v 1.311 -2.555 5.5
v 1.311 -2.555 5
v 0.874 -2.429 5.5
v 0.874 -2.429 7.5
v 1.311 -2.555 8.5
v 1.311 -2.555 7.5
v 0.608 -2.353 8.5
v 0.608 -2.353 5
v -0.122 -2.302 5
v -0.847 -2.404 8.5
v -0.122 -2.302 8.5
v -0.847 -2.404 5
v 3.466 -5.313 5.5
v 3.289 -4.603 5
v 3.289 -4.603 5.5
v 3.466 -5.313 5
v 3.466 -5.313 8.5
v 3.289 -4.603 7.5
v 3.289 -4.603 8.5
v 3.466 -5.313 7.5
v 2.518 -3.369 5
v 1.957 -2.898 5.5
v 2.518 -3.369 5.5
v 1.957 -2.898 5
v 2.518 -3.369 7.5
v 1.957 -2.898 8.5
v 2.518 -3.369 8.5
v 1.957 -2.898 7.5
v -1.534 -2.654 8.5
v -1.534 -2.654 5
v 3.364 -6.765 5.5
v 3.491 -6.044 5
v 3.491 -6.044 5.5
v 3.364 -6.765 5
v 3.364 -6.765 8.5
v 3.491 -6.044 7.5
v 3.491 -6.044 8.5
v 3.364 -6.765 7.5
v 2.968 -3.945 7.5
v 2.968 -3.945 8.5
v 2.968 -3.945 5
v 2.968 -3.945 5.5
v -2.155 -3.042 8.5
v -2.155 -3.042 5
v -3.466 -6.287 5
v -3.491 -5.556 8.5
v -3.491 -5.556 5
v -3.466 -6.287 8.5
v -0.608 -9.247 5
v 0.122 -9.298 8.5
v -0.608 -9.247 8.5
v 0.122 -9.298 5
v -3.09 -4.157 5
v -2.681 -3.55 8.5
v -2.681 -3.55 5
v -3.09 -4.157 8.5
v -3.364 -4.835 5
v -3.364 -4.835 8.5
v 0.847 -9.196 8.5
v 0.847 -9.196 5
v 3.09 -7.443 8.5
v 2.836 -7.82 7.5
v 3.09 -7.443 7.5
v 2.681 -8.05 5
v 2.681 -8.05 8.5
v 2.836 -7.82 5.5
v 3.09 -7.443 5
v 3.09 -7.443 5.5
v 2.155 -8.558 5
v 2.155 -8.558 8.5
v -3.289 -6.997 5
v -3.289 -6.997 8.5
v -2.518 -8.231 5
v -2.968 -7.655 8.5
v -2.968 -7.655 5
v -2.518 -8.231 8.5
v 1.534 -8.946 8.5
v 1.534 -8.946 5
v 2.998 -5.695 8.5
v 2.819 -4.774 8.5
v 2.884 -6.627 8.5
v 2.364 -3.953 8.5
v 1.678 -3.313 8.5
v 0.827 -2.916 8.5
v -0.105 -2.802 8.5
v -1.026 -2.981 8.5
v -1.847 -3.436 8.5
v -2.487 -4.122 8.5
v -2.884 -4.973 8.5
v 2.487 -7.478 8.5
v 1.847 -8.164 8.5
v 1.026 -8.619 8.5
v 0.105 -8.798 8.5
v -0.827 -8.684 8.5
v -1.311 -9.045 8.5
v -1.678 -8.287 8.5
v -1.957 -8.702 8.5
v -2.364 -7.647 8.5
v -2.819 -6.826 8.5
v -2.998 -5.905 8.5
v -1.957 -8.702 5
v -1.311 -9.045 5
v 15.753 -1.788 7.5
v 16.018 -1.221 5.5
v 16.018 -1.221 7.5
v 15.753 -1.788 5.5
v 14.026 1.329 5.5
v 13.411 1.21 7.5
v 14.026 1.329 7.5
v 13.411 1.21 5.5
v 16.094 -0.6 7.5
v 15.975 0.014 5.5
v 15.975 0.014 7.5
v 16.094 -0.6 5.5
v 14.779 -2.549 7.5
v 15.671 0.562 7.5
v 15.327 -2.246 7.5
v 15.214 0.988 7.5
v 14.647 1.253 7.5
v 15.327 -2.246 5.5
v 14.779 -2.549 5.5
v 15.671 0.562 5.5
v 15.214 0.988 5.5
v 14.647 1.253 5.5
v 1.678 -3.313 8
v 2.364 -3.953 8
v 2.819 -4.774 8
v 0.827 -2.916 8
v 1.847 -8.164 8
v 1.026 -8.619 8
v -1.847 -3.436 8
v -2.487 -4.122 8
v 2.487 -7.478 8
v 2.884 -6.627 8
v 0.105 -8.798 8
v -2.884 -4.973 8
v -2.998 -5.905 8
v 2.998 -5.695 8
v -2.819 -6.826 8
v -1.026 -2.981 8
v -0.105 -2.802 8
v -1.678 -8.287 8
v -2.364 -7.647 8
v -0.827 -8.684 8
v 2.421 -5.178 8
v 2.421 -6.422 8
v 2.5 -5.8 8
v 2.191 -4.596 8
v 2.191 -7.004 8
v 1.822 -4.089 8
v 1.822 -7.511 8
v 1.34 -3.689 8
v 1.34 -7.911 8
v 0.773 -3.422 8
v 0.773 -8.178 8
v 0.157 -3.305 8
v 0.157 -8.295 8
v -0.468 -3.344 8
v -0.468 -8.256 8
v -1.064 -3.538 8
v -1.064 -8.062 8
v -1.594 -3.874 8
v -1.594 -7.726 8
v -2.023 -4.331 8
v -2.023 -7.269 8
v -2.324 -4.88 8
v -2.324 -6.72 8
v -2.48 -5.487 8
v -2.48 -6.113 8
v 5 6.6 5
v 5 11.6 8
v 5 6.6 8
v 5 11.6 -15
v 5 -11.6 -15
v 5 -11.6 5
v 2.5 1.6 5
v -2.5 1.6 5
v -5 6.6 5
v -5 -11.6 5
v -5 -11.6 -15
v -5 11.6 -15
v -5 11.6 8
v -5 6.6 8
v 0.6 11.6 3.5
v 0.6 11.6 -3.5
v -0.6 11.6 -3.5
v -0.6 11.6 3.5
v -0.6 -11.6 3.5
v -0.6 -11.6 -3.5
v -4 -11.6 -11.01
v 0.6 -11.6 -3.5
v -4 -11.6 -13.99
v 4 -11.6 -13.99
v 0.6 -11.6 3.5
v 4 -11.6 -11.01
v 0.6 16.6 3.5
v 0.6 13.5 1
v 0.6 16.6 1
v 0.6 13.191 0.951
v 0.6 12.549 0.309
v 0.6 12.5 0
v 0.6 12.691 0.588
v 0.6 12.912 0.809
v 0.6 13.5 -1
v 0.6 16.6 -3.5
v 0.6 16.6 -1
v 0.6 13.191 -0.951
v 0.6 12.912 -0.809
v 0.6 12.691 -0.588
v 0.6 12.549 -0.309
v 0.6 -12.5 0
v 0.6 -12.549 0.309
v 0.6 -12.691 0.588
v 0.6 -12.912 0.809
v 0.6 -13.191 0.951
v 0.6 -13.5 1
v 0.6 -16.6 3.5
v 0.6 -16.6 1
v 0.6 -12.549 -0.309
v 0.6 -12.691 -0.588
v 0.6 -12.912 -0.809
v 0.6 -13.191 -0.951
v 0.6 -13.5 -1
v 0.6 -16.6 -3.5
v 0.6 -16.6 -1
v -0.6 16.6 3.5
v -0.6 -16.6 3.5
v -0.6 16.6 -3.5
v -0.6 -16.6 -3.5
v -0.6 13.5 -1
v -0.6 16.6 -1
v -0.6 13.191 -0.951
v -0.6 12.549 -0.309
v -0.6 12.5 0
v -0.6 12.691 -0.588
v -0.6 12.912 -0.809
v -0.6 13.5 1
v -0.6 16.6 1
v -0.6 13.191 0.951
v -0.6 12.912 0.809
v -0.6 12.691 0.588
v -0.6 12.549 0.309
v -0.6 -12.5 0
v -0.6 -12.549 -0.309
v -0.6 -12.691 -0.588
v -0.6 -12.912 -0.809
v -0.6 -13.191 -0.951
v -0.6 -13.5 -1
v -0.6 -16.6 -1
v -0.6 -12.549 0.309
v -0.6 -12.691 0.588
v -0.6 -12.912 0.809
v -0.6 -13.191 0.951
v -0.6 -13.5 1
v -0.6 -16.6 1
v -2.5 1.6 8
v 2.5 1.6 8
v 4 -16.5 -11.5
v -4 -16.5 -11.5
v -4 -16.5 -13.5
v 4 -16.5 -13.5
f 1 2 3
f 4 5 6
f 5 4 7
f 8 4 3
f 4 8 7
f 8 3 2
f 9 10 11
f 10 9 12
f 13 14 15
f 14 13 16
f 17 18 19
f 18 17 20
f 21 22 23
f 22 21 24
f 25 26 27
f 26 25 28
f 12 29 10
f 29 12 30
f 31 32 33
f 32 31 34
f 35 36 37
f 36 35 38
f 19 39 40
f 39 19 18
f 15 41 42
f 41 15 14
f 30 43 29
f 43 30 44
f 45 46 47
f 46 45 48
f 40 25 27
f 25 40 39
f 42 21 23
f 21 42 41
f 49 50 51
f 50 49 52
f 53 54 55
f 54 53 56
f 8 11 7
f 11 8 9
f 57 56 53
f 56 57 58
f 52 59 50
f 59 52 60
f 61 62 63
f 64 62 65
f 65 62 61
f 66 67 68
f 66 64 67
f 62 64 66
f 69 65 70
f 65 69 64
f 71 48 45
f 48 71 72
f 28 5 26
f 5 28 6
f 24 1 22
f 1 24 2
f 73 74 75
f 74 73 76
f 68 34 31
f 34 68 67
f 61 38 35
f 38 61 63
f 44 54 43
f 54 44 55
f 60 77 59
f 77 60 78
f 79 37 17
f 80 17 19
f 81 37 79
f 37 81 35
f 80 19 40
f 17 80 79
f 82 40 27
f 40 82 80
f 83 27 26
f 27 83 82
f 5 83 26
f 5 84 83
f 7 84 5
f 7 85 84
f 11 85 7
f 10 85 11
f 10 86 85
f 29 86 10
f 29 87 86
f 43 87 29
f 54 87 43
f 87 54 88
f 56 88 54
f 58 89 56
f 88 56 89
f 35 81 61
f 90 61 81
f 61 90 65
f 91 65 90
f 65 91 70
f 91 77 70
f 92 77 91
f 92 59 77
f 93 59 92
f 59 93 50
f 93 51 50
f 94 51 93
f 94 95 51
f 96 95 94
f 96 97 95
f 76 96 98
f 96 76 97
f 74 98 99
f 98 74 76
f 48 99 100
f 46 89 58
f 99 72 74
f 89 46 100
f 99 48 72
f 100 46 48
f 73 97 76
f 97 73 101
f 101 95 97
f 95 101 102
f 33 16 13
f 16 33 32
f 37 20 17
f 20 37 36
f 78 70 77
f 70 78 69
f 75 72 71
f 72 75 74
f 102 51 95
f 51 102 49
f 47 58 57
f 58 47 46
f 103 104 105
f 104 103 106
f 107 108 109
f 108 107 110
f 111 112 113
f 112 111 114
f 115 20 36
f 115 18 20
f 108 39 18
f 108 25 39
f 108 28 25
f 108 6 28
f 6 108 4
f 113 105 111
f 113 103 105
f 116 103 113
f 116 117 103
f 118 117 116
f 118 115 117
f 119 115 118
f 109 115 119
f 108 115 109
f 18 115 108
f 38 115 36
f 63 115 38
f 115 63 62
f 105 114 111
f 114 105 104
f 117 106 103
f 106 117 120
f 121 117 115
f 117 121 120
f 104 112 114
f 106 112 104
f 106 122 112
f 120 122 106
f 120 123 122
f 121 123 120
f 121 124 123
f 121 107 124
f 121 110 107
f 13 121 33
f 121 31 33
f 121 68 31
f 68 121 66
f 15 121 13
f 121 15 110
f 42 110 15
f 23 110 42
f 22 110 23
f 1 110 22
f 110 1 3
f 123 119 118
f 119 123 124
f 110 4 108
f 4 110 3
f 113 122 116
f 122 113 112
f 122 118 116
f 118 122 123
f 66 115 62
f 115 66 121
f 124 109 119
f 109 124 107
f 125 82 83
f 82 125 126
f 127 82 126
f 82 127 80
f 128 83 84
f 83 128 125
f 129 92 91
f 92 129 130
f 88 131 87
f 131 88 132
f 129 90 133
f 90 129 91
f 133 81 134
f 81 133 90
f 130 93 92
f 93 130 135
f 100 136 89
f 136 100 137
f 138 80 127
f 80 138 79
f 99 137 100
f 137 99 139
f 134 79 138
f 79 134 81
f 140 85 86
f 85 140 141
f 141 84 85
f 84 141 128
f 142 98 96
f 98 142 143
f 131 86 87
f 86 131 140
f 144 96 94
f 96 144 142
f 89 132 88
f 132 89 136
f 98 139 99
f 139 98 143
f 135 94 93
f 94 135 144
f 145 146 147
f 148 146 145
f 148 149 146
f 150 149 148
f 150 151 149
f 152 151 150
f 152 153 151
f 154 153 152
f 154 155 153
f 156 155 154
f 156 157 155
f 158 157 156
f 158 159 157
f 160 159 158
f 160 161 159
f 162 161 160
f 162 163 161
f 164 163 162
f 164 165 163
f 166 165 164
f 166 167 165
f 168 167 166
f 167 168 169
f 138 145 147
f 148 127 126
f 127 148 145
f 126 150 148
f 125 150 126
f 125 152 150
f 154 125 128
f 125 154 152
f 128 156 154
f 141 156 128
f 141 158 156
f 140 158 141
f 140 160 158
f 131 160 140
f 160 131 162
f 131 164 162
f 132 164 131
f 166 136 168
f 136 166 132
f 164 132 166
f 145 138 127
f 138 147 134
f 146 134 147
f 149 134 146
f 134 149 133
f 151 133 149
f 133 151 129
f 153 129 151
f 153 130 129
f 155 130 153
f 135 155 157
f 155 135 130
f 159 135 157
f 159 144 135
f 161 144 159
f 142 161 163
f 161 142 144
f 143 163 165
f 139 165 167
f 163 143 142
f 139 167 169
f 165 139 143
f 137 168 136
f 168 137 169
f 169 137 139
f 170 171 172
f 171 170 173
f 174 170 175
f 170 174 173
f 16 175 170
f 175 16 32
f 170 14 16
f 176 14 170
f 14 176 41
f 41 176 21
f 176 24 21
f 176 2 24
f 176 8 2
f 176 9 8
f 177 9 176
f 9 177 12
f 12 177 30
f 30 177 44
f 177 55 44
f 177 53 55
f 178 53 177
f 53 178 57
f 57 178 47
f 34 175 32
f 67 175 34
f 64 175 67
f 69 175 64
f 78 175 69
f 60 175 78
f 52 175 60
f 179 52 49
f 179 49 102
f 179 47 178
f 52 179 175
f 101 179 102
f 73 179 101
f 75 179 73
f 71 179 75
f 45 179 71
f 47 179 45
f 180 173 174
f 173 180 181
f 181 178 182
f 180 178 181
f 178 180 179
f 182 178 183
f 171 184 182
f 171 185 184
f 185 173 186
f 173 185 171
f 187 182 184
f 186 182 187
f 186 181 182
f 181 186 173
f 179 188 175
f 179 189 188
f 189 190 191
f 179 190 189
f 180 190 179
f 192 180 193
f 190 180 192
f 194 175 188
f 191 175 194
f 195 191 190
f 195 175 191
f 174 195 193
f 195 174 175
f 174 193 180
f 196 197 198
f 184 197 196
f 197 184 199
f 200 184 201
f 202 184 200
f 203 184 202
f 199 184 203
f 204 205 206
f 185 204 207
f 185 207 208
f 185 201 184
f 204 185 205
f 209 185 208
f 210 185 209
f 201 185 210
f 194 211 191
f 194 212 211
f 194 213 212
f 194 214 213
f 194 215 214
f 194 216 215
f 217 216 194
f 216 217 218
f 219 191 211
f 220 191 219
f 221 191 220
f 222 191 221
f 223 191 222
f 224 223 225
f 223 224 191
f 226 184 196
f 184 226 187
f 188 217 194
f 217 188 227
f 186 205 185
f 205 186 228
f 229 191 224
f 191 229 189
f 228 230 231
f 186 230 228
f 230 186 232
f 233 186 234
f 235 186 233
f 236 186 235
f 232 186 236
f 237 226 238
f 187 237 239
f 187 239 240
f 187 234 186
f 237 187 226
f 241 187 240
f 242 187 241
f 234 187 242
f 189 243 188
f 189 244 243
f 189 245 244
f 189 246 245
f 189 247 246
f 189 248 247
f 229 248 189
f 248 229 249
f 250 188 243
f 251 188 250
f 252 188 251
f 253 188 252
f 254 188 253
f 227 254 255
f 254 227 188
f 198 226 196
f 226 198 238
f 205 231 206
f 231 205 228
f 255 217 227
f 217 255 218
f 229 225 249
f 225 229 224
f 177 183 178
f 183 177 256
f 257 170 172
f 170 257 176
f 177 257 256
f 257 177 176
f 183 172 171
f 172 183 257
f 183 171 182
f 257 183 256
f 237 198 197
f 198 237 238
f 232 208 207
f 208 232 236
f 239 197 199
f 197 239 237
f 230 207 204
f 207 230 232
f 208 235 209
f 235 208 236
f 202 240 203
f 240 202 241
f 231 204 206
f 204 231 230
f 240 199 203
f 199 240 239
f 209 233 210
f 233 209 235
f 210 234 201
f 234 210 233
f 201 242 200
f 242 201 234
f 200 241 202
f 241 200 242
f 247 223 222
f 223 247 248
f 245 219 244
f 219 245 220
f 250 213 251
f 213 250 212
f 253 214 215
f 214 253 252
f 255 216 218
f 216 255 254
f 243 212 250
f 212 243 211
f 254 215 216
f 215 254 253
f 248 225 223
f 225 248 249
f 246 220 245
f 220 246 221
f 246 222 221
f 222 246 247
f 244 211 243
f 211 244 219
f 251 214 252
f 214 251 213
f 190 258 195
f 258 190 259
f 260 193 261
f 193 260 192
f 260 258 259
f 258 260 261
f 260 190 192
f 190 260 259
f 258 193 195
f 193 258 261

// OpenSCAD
module paka_jednostranna(){
    difference(){
        union(){
            cylinder(d=7, h=4, center=true, $fn=30);
            hull(){
                cylinder(d=6, h=2, center=true, $fn=20);
                translate([15, 0, 0]) cylinder(d=4, h=2, center=true, $fn=20);
            }
        }
        cylinder(d=3, h=10, center=true, $fn=20);
        translate([0, 0, 1.5]) cylinder(d=6, h=10, $fn=20);
    }
}


module servo_bms_115(angle = 0){
    
    translate([0, -23.2/4, 5+3/2]) rotate([0, 0, angle]) children(0);
    
    difference(){
        union(){
            translate([-10/2, -23.2/2, -20+5]) cube([10, 23.2, 20]);
            translate([-1.2/2, -23.2/2-5, -7/2]) cube([1.2, 23.2+10, 7]);
            
            hull(){
                translate([-10/2, 23.2/2-5, -20+5]) cube([10, 5, 23]);
                translate([-5/2, 23.2/2-10, -20+5]) cube([5, 10, 23]);
            }
            
            translate([0, -23.2/4, 5]) cylinder(d = 5, h = 3, $fn=25);
        }
        
        translate([0, 27/2, 0]) rotate([0, 90, 0]) hull(){
            cylinder(d=2, h=20, center=true, $fn=20);
            translate([0, 5, 0]) cylinder(d=2, h=20, center=true, $fn=20);
        }
        
        translate([0, -27/2, 0]) rotate([0, 90, 0]) hull(){
            cylinder(d=2, h=20, center=true, $fn=20);
            translate([0, -5, 0]) cylinder(d=2, h=20, center=true, $fn=20);
        }
        
    }
    
    hull(){
        translate([-4, -5-23/2, -20+5+3/2]) cube([8, 5, 2]);
        translate([-4, -23/2, -20+5+2/2]) cube([8, 1, 3]);
    }
}



servo_bms_115(20){ paka_jednostranna(); }
